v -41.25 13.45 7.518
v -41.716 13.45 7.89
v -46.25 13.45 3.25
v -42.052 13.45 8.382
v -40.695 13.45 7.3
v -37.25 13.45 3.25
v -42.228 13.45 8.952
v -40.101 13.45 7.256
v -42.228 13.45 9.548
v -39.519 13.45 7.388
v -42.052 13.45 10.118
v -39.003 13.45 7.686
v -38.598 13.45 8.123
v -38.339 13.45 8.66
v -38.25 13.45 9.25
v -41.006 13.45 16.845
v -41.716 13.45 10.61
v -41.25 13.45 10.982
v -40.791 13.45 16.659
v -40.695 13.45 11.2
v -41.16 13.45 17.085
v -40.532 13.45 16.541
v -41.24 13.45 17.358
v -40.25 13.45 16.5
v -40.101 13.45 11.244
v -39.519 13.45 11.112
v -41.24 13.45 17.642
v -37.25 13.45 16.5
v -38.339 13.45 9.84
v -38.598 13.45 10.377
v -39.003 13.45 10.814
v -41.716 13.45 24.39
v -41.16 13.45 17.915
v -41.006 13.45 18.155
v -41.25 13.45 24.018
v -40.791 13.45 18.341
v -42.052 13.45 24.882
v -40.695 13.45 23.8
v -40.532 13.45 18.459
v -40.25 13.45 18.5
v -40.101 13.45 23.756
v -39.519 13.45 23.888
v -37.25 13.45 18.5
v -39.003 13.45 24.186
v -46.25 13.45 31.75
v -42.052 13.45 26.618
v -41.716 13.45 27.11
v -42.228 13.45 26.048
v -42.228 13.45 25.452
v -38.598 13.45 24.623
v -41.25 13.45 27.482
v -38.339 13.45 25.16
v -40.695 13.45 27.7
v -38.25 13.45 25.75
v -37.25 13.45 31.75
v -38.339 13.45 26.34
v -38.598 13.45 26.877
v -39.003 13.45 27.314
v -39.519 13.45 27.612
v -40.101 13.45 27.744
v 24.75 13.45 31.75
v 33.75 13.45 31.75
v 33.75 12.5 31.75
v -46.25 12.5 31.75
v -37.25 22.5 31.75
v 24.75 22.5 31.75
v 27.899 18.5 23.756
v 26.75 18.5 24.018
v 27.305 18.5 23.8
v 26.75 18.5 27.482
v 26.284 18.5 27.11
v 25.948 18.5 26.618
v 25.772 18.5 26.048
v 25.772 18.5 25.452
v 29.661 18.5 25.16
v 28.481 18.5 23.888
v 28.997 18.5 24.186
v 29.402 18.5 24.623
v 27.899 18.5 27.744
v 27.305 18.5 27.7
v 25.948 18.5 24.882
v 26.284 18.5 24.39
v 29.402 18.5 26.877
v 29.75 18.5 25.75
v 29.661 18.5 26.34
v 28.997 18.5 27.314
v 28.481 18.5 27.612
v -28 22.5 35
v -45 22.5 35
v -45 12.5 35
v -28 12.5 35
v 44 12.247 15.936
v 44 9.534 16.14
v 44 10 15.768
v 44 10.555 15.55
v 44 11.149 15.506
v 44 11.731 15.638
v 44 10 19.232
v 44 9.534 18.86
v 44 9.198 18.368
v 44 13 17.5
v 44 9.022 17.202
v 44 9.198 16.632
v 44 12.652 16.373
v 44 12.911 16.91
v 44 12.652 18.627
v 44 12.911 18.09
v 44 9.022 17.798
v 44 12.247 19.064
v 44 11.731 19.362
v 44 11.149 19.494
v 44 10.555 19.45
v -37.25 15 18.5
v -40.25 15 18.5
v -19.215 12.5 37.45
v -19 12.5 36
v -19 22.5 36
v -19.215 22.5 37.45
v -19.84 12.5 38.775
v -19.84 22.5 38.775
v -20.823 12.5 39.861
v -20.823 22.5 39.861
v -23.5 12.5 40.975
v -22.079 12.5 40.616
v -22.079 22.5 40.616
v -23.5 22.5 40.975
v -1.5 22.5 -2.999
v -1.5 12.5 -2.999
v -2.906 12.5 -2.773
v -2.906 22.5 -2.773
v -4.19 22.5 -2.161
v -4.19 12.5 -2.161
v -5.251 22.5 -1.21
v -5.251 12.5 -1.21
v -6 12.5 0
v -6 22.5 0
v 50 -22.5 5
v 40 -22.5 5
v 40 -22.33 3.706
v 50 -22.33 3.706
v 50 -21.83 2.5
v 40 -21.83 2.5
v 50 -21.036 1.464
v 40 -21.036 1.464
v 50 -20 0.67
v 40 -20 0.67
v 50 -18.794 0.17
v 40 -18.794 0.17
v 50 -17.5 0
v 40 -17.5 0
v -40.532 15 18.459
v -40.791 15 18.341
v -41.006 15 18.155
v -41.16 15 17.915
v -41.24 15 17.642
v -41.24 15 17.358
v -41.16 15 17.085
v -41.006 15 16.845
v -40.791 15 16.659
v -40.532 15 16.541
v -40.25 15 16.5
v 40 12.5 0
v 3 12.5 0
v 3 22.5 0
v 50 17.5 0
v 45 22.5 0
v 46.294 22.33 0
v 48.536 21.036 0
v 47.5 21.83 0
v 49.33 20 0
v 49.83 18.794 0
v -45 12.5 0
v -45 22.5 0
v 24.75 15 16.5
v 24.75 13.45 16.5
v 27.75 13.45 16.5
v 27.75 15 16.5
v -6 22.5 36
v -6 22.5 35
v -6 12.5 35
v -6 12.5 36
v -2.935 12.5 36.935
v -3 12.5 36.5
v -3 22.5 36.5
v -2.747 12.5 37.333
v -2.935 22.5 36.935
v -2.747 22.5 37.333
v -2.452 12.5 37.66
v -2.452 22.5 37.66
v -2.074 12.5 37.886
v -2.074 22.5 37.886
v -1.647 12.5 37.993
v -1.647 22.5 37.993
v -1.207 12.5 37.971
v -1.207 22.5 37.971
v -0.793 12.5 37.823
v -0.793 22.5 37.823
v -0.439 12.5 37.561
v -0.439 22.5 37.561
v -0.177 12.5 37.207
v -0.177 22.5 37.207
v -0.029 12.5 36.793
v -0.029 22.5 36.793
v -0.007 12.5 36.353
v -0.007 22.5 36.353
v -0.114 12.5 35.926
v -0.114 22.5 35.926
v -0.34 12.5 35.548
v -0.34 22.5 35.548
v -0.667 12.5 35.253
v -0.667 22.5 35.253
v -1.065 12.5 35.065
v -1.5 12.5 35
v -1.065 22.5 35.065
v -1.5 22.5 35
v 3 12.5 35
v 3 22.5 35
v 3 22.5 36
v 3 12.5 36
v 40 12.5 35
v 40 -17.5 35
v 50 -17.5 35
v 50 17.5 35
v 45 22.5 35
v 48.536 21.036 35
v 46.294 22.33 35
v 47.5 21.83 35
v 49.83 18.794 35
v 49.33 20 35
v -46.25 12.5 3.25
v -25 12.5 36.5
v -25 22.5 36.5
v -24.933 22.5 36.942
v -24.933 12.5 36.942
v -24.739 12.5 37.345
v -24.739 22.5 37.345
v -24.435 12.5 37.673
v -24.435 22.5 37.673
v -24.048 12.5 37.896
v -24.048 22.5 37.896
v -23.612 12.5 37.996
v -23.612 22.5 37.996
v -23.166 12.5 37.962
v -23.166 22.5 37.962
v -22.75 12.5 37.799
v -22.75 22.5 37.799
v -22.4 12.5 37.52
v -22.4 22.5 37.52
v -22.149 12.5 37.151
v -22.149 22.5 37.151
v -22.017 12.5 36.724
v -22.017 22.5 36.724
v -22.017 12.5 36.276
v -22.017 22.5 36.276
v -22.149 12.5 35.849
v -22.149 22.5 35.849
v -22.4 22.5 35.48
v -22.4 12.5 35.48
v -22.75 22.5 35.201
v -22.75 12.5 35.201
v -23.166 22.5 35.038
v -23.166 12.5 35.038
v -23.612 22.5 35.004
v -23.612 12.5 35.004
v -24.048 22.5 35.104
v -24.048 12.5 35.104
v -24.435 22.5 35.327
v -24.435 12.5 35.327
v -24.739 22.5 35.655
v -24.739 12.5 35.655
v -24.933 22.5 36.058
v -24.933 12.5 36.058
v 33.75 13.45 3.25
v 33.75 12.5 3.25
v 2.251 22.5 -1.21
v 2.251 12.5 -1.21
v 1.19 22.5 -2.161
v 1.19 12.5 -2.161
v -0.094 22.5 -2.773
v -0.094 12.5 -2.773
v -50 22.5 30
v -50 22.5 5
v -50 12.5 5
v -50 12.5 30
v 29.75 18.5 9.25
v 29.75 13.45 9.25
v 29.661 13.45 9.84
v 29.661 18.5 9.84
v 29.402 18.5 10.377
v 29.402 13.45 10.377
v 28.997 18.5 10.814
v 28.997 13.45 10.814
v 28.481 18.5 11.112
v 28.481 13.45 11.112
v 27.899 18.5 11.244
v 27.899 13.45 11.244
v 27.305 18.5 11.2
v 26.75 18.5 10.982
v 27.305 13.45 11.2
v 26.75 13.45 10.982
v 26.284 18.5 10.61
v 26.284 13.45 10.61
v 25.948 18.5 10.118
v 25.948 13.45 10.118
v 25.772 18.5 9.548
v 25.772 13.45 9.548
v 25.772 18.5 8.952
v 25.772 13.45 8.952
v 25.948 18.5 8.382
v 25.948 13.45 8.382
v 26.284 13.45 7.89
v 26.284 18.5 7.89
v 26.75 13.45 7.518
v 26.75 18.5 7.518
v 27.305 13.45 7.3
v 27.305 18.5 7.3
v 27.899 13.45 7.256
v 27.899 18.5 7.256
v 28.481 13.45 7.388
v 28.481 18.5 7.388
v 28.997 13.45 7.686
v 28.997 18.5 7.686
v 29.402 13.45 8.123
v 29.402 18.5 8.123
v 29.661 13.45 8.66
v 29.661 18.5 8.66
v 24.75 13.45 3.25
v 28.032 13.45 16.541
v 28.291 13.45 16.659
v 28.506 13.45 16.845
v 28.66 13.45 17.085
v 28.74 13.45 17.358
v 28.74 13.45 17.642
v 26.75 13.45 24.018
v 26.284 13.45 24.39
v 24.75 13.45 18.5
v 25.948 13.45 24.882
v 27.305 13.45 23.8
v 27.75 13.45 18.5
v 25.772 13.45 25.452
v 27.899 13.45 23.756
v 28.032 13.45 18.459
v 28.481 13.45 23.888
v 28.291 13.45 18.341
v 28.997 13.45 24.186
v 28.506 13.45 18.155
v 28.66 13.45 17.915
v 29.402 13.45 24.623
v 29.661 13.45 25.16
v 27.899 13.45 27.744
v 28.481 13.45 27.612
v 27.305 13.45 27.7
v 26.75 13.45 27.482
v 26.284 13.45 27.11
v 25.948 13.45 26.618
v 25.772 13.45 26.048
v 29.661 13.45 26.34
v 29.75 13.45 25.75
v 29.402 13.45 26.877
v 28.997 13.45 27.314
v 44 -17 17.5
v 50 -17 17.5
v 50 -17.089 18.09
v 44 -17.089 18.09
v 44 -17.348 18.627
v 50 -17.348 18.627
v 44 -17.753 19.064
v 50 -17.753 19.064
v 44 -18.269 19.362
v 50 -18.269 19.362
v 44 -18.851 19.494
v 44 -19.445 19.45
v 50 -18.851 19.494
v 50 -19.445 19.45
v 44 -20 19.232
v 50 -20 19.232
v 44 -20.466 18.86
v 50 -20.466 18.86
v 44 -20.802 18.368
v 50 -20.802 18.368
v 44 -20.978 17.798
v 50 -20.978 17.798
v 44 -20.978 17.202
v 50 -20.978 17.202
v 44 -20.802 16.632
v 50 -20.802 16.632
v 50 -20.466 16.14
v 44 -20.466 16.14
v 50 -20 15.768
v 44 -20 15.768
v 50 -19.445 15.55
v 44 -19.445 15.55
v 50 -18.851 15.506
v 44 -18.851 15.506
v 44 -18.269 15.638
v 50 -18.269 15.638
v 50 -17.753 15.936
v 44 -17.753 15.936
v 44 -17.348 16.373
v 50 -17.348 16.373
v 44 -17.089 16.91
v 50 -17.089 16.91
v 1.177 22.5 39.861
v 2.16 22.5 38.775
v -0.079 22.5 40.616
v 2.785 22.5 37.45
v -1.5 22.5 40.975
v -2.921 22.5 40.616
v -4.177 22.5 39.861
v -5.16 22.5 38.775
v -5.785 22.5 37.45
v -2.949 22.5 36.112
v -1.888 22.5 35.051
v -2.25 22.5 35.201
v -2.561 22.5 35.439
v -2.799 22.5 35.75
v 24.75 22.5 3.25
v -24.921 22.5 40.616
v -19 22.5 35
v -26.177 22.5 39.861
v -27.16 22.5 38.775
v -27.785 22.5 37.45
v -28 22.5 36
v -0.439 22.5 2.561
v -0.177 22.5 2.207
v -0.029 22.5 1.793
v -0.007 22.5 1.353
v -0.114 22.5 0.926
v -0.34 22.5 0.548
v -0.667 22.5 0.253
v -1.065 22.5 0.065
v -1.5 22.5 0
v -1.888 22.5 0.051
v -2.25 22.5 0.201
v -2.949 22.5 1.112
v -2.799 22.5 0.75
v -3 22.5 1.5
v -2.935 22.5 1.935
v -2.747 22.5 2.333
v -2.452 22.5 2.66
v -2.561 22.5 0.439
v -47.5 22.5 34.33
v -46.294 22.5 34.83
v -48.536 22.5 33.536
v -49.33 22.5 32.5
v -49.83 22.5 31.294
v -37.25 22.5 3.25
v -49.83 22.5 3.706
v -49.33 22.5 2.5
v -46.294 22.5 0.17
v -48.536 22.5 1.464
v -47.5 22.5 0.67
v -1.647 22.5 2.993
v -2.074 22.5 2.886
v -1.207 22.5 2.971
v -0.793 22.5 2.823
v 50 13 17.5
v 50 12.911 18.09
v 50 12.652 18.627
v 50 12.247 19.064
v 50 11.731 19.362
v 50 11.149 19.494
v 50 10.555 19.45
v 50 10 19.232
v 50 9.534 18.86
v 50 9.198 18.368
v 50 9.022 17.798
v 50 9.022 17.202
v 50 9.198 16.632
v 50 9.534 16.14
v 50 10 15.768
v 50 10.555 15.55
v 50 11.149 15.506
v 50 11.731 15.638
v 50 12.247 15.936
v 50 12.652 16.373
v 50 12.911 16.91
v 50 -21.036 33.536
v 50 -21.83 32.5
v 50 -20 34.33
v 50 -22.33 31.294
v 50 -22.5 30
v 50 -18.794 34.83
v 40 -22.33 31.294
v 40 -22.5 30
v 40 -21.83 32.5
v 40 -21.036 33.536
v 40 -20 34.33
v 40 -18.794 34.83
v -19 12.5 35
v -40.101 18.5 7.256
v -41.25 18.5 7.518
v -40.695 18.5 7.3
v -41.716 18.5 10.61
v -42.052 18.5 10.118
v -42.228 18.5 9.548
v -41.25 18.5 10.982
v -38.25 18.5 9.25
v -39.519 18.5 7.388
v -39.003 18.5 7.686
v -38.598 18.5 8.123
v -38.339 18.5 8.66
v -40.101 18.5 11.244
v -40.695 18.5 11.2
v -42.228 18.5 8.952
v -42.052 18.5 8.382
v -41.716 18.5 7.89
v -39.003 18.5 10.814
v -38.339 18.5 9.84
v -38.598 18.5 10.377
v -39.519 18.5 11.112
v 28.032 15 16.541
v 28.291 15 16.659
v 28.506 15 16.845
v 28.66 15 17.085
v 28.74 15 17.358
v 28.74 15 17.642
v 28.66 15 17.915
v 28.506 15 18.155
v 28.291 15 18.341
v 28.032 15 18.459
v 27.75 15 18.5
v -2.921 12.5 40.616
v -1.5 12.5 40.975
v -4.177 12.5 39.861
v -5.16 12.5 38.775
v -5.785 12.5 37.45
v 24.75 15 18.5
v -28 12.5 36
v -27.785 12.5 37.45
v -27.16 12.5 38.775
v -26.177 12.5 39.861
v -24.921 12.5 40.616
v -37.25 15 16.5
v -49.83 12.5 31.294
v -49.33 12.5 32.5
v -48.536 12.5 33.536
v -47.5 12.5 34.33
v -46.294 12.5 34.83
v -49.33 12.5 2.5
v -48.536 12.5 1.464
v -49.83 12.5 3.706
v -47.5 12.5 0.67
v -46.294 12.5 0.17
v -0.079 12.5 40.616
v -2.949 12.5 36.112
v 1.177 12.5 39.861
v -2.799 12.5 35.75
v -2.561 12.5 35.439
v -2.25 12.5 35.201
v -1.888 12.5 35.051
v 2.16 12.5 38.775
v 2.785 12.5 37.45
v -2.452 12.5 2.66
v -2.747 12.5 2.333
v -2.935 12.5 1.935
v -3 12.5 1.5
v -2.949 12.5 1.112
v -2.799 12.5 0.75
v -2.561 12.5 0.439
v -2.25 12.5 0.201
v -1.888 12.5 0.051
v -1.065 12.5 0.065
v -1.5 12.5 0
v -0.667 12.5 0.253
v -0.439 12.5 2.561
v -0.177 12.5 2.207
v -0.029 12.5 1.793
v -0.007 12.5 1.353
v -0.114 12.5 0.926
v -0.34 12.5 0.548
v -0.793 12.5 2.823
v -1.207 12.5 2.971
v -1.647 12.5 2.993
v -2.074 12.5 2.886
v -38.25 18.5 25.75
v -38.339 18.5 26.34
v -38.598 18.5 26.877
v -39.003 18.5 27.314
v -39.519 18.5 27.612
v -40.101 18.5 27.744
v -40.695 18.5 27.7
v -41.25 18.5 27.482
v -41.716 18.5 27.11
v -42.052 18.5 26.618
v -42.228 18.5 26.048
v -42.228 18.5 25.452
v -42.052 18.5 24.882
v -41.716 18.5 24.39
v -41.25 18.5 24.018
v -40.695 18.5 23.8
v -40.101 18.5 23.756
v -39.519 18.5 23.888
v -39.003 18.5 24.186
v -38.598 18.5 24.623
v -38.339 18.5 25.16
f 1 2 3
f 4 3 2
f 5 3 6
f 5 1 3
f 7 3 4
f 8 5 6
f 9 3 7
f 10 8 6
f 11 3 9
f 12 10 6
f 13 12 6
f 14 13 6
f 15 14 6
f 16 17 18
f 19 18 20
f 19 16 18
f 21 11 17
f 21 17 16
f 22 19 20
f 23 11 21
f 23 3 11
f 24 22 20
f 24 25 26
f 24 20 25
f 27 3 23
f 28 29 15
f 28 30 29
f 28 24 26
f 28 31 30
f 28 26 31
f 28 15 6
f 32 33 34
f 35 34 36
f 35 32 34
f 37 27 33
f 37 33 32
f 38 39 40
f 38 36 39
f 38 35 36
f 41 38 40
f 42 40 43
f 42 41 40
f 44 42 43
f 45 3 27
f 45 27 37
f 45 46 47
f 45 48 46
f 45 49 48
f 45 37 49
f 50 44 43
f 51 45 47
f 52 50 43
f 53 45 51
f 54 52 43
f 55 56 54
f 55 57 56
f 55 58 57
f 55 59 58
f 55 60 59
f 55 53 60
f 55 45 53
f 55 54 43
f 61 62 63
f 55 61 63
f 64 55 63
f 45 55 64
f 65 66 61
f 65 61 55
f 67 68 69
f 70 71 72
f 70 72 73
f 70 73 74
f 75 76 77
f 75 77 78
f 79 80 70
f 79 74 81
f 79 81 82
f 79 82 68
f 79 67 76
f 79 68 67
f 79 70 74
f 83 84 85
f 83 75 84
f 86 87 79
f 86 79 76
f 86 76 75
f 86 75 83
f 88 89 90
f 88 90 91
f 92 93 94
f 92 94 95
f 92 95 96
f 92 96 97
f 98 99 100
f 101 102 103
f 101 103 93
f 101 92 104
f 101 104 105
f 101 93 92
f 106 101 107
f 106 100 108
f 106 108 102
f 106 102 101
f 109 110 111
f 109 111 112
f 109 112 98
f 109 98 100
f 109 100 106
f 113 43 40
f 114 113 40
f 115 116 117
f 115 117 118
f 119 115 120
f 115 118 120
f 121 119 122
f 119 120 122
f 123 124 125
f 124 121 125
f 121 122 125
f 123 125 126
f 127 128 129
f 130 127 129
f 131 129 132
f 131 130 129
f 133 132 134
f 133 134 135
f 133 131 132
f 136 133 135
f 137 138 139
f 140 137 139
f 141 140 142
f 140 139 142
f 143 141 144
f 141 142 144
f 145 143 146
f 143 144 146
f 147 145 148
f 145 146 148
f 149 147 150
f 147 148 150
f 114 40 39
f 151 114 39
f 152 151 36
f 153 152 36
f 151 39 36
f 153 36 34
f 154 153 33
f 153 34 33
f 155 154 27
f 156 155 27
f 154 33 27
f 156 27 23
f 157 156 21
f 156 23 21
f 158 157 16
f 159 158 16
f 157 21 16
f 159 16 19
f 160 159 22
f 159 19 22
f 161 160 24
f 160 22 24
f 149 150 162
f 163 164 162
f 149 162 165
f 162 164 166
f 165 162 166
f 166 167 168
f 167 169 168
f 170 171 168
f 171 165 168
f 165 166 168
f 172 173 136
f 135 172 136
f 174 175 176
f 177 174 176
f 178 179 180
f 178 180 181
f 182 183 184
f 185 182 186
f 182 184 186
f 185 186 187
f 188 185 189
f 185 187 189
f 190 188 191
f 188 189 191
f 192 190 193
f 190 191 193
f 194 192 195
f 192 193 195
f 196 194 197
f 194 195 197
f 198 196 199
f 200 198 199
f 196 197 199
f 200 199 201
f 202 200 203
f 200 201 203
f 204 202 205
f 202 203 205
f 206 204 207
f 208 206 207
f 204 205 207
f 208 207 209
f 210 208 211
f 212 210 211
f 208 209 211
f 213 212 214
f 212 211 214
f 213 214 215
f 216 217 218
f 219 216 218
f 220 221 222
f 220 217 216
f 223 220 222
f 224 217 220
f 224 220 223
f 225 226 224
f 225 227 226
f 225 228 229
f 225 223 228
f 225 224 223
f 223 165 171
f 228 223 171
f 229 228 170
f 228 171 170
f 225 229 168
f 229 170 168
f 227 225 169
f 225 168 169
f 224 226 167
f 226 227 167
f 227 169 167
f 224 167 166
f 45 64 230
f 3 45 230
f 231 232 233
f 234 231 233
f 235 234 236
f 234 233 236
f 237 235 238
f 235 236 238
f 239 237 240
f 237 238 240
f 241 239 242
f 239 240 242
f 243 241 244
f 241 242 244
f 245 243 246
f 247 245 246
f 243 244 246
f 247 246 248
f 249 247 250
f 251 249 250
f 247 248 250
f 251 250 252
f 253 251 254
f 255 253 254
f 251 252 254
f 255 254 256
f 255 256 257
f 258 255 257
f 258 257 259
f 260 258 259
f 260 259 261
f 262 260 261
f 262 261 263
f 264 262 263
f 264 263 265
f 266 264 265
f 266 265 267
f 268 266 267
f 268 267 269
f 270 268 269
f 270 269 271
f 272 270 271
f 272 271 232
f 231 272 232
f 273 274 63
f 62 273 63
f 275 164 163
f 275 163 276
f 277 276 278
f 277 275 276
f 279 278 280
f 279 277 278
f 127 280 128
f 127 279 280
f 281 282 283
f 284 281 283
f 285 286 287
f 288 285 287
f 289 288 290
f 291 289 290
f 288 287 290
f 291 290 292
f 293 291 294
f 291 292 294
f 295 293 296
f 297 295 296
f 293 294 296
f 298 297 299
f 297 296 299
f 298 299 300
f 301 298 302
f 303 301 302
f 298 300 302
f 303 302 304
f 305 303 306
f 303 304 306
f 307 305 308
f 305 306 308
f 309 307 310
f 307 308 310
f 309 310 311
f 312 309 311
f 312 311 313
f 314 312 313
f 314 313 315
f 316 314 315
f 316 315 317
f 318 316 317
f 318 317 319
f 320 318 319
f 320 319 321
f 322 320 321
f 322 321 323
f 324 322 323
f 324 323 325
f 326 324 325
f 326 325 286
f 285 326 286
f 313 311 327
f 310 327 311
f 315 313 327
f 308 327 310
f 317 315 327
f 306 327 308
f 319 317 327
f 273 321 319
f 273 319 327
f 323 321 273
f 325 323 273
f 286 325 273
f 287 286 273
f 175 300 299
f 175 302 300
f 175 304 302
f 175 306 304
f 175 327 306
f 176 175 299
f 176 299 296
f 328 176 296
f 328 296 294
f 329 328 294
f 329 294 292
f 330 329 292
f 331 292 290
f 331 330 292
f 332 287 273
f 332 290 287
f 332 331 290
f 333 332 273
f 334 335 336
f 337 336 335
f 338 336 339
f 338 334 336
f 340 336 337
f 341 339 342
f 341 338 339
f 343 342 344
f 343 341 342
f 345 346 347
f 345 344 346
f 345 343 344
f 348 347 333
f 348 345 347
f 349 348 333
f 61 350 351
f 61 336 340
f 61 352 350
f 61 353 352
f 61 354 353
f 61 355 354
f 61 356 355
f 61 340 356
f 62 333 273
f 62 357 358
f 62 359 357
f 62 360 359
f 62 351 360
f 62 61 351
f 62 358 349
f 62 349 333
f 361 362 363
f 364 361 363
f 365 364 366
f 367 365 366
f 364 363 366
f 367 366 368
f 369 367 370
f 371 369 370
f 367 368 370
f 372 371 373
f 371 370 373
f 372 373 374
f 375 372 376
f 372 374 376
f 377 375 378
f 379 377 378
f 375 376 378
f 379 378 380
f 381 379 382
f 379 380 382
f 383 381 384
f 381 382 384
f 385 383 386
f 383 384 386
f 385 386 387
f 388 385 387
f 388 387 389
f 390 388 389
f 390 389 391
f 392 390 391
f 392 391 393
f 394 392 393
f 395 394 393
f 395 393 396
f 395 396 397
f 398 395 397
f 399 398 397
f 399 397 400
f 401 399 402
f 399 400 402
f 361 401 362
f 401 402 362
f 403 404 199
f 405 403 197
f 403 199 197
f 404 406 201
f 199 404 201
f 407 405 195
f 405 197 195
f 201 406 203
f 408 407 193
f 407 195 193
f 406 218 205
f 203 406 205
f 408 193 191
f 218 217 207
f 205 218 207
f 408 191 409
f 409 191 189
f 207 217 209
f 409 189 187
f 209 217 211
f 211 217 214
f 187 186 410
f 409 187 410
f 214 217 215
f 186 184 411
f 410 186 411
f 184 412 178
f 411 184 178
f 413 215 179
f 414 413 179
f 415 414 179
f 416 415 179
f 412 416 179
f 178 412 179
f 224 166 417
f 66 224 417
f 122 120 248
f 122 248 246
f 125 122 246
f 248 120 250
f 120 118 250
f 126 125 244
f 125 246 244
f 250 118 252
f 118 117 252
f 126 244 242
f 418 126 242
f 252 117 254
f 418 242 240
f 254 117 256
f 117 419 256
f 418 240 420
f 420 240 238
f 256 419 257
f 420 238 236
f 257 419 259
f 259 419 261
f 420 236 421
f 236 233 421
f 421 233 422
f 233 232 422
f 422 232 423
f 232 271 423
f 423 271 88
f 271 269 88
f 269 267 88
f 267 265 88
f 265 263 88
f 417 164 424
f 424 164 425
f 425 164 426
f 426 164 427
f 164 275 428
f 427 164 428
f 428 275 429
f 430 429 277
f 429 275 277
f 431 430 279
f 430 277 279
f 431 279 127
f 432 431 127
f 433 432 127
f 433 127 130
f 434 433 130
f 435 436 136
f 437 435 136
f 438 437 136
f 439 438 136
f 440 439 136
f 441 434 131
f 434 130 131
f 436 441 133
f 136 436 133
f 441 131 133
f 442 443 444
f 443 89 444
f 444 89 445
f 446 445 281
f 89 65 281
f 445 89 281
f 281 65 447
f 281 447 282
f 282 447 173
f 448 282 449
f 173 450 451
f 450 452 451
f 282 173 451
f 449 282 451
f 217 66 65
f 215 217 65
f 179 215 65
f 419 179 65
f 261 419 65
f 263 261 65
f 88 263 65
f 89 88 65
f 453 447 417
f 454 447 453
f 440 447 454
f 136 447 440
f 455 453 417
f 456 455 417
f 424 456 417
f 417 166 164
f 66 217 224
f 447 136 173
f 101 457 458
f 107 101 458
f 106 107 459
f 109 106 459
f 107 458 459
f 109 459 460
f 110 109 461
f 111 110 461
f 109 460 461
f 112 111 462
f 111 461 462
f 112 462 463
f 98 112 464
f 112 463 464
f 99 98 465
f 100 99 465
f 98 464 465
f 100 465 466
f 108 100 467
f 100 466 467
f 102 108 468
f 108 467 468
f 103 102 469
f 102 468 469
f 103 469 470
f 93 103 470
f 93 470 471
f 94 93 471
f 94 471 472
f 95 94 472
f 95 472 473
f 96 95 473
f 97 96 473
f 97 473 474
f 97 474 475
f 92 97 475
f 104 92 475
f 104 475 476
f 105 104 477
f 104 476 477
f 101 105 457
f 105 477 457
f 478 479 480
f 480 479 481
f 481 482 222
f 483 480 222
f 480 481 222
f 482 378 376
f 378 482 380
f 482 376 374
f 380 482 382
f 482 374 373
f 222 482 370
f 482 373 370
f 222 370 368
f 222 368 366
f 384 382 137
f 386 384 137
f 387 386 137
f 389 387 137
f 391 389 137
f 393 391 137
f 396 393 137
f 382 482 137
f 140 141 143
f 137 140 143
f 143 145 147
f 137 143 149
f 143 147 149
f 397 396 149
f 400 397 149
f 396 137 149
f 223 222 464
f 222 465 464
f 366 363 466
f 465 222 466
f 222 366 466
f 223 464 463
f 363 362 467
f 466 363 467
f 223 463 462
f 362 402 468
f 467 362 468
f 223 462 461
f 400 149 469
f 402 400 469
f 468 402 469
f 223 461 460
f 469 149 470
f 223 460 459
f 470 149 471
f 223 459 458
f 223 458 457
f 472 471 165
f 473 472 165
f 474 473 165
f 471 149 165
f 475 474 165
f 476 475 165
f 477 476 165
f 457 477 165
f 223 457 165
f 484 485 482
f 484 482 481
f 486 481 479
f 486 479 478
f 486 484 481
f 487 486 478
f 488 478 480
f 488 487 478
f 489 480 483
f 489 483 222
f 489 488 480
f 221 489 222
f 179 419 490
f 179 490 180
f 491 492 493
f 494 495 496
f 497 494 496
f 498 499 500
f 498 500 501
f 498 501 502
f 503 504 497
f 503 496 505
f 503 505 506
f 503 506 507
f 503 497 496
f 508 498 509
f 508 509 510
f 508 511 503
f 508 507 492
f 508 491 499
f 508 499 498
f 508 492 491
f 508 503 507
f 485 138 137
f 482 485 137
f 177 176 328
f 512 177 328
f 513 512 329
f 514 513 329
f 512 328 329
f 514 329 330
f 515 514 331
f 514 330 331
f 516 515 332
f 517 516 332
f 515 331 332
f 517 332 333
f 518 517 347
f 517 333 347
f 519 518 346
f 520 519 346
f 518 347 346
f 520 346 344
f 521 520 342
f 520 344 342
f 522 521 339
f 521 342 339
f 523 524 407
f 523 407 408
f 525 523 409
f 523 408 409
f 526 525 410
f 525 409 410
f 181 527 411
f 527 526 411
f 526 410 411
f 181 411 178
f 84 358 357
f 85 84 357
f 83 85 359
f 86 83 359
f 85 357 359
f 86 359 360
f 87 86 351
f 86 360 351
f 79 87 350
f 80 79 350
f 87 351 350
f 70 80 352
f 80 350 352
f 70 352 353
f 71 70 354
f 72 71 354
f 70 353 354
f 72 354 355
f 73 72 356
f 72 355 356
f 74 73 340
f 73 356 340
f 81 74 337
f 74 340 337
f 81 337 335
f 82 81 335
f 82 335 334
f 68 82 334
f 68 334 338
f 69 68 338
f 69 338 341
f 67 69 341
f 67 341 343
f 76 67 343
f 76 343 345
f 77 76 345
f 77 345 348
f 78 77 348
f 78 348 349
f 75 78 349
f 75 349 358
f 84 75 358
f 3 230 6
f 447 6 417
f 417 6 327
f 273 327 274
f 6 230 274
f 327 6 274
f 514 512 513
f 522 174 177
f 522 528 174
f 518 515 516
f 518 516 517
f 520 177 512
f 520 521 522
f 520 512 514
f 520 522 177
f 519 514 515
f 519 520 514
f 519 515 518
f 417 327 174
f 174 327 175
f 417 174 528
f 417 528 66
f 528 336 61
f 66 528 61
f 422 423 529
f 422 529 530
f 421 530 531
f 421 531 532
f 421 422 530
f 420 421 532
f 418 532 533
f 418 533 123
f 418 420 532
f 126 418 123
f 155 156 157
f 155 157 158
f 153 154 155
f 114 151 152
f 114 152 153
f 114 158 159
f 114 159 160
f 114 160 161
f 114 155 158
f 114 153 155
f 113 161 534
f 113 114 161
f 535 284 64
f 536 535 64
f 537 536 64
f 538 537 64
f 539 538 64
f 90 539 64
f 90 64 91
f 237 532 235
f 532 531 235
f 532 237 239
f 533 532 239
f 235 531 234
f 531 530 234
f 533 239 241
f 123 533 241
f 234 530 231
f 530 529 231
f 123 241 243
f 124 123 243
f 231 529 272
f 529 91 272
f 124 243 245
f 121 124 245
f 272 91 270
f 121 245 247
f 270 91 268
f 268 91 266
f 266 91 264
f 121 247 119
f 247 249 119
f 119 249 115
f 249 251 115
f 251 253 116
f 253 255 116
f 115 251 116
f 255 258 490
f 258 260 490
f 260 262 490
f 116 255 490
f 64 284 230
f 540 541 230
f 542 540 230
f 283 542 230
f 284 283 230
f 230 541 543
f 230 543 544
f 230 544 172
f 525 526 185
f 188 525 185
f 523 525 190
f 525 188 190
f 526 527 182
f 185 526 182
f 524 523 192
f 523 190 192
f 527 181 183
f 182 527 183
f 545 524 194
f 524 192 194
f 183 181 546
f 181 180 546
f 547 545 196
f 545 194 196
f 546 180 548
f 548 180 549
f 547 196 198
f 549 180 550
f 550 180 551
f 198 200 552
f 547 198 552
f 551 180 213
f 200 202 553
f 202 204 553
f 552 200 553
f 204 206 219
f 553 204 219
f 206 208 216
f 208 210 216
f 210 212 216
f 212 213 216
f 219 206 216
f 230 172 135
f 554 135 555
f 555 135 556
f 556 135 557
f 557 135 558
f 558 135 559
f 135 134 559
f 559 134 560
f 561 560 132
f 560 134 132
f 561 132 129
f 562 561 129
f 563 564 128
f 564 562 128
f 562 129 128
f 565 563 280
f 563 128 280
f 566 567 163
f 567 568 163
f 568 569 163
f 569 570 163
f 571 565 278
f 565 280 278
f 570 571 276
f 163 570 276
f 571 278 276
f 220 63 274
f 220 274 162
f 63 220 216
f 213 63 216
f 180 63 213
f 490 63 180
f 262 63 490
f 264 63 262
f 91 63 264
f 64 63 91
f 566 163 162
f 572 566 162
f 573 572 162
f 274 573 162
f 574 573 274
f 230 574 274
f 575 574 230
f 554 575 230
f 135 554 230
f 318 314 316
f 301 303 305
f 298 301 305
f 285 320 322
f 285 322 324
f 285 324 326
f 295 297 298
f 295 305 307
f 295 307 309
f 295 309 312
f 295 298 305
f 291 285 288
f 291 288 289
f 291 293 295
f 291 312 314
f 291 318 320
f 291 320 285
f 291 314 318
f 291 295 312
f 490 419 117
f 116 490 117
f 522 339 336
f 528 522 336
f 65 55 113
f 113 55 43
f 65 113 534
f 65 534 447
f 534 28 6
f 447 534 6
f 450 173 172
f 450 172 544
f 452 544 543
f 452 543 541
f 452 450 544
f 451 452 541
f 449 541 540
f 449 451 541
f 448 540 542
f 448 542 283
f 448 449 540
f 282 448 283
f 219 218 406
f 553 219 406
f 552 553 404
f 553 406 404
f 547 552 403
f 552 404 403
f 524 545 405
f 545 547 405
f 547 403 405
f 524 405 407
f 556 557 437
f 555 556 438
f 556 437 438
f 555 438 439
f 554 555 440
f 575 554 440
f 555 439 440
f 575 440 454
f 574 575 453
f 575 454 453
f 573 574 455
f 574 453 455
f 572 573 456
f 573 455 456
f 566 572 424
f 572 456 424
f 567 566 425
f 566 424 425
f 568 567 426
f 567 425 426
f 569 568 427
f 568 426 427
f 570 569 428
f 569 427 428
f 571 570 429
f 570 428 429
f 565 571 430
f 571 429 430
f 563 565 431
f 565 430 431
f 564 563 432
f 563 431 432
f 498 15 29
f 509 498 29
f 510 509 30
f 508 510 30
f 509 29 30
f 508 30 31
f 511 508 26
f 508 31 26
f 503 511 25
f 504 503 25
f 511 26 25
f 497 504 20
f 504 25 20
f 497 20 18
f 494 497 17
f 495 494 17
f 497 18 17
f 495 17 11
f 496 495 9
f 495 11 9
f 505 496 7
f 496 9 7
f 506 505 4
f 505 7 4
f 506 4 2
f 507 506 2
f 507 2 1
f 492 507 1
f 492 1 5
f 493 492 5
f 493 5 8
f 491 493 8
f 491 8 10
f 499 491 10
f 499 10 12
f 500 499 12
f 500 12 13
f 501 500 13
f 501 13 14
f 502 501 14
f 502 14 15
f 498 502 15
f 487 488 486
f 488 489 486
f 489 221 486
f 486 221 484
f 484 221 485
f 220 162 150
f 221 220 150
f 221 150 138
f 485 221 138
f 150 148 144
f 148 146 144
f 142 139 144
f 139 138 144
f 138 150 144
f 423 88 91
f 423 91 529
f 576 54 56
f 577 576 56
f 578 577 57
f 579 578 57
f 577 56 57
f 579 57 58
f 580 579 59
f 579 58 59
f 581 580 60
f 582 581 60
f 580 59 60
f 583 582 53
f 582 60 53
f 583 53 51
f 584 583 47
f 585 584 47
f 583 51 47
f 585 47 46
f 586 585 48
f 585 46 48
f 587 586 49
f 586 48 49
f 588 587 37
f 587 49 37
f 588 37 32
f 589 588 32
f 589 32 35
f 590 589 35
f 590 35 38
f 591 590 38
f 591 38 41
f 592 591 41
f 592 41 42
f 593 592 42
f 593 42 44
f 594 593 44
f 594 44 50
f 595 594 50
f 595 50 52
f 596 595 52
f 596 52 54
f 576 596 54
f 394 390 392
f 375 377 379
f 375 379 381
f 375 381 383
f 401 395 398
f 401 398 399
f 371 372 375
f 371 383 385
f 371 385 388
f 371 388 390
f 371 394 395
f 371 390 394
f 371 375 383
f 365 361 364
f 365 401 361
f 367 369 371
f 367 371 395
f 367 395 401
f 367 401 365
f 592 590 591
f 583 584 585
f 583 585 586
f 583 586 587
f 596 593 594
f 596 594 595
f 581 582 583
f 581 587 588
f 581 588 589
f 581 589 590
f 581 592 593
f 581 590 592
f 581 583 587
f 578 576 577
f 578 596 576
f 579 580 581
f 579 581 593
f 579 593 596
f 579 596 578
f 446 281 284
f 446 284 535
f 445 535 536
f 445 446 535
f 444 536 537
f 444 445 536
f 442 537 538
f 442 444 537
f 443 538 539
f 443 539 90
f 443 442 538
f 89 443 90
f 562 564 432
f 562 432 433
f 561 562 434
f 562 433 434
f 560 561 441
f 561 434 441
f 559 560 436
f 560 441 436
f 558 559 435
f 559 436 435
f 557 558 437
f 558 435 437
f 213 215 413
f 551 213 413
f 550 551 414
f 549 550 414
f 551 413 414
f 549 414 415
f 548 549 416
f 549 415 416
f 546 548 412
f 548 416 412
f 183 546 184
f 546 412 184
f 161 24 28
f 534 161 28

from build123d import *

# Parameters (mm, degrees)
F2_DEPTH     = 35
F4_DEPTH     = 10
F3_R         = 2
F5_DEPTH     = 0.95
F6_DEPTH     = 2.5
F7_DEPTH     = 6
F8_W         = 9
F8_H         = 9.25
F8_R         = 1.5
F8_H_2       = 6.25
F9_DEPTH     = 10
F10_DEPTH    = 10
F11_R        = 2
F12_DEPTH    = 6
F13_T1_DEPTH = 35
F13_T3_DEPTH = 35
F13_T5_DEPTH = 60
F13_T7_DEPTH = 32.9128784748


# Not quite as in the source:
# - a fillet or chamfer that OpenCascade refuses, or shapes differently, is made with other operations: its cross-section is extruded or revolved along the edge and cut away or added


with BuildPart() as f2:
    # F1 (on Top) → F2 (new body)
    with BuildSketch(Plane.XY):
        Polygon((50, -22.5), (50, 22.5), (-50, 22.5), (-50, 12.5), (40, 12.5), (40, -22.5), align=None)
    extrude(amount=F2_DEPTH)

    # F3 (on face) → F4 (cut, through all)
    with BuildSketch(Plane.XZ.offset(-12.5)):
        with BuildLine():
            Line((-37.25, 3.25), (24.75, 3.25))
            Line((24.75, 3.25), (24.75, 16.5))
            ThreePointArc((24.75, 16.5), (23.75, 17.5), (24.75, 18.5))
            Line((24.75, 18.5), (24.75, 31.75))
            Line((24.75, 31.75), (-37.25, 31.75))
            Line((-37.25, 31.75), (-37.25, 18.5))
            ThreePointArc((-37.25, 18.5), (-36.25, 17.5), (-37.25, 16.5))
            Line((-37.25, 16.5), (-37.25, 3.25))
        make_face()
        with BuildLine():
            Line((-37.25, 17.5), (-37.25, 16.5))
            ThreePointArc((-37.25, 16.5), (-36.25, 17.5), (-37.25, 18.5))
            Line((-37.25, 18.5), (-37.25, 17.5))
        make_face()
        with BuildLine():
            ThreePointArc((24.75, 18.5), (23.75, 17.5), (24.75, 16.5))
            Line((24.75, 16.5), (24.75, 17.5))
            Line((24.75, 17.5), (24.75, 18.5))
        make_face()
    extrude(amount=-F4_DEPTH, mode=Mode.SUBTRACT)

    # F3 (on face) → F5 (cut)
    with BuildSketch(Plane.XZ.offset(-12.5)):
        with BuildLine():
            Line((-43.25, 3.25), (-37.25, 3.25))
            Line((-37.25, 3.25), (-37.25, 16.5))
            Line((-37.25, 16.5), (-40.25, 16.5))
            ThreePointArc((-40.25, 16.5), (-41.25, 17.5), (-40.25, 18.5))
            Line((-40.25, 18.5), (-37.25, 18.5))
            Line((-37.25, 18.5), (-37.25, 31.75))
            Line((-37.25, 31.75), (-43.25, 31.75))
            Line((-43.25, 31.75), (-46.25, 31.75))
            Line((-46.25, 31.75), (-46.25, 3.25))
            Line((-46.25, 3.25), (-43.25, 3.25))
        make_face()
        with Locations((-40.25, 9.25)):
            Circle(F3_R, mode=Mode.SUBTRACT)
        with Locations((-40.25, 25.75)):
            Circle(F3_R, mode=Mode.SUBTRACT)
        with BuildLine():
            Line((27.75, 3.25), (30.75, 3.25))
            Line((30.75, 3.25), (33.75, 3.25))
            Line((33.75, 3.25), (33.75, 31.75))
            Line((33.75, 31.75), (30.75, 31.75))
            Line((30.75, 31.75), (24.75, 31.75))
            Line((24.75, 31.75), (24.75, 18.5))
            Line((24.75, 18.5), (27.75, 18.5))
            ThreePointArc((27.75, 18.5), (28.75, 17.5), (27.75, 16.5))
            Line((27.75, 16.5), (24.75, 16.5))
            Line((24.75, 16.5), (24.75, 3.25))
            Line((24.75, 3.25), (27.75, 3.25))
        make_face()
        with Locations((27.75, 9.25)):
            Circle(F3_R, mode=Mode.SUBTRACT)
        with Locations((27.75, 25.75)):
            Circle(F3_R, mode=Mode.SUBTRACT)
        with BuildLine():
            Line((-40.25, 16.5), (-37.25, 16.5))
            Line((-37.25, 16.5), (-37.25, 17.5))
            Line((-37.25, 17.5), (-37.25, 18.5))
            Line((-37.25, 18.5), (-40.25, 18.5))
            ThreePointArc((-40.25, 18.5), (-41.25, 17.5), (-40.25, 16.5))
        make_face()
        with BuildLine():
            Line((24.75, 17.5), (24.75, 16.5))
            Line((24.75, 16.5), (27.75, 16.5))
            ThreePointArc((27.75, 16.5), (28.75, 17.5), (27.75, 18.5))
            Line((27.75, 18.5), (24.75, 18.5))
            Line((24.75, 18.5), (24.75, 17.5))
        make_face()
    extrude(amount=-F5_DEPTH, mode=Mode.SUBTRACT)

    # F3 (on face) → F6 (cut)
    with BuildSketch(Plane.XZ.offset(-12.5)):
        with BuildLine():
            Line((-40.25, 16.5), (-37.25, 16.5))
            Line((-37.25, 16.5), (-37.25, 17.5))
            Line((-37.25, 17.5), (-37.25, 18.5))
            Line((-37.25, 18.5), (-40.25, 18.5))
            ThreePointArc((-40.25, 18.5), (-41.25, 17.5), (-40.25, 16.5))
        make_face()
        with BuildLine():
            Line((24.75, 17.5), (24.75, 16.5))
            Line((24.75, 16.5), (27.75, 16.5))
            ThreePointArc((27.75, 16.5), (28.75, 17.5), (27.75, 18.5))
            Line((27.75, 18.5), (24.75, 18.5))
            Line((24.75, 18.5), (24.75, 17.5))
        make_face()
    extrude(amount=-F6_DEPTH, mode=Mode.SUBTRACT)

    # F3 (on face) → F7 (cut)
    with BuildSketch(Plane.XZ.offset(-12.5)):
        with Locations((-40.25, 25.75)):
            Circle(F3_R)
        with Locations((-40.25, 9.25)):
            Circle(F3_R)
        with Locations((27.75, 9.25)):
            Circle(F3_R)
        with Locations((27.75, 25.75)):
            Circle(F3_R)
    extrude(amount=-F7_DEPTH, mode=Mode.SUBTRACT)

    # F8 (on face) → F9 (join, through all)
    with BuildSketch(Plane(origin=(0, 22.5, 0), x_dir=(-1, 0, 0), z_dir=(0, 1, 0))):
        with Locations((1.5, 36.375)):
            Rectangle(F8_W, F8_H)
        with Locations((1.5, 36.5)):
            Circle(F8_R, mode=Mode.SUBTRACT)
        with Locations((1.5, 0.125)):
            Rectangle(F8_W, F8_H_2)
        with Locations((1.5, 1.5)):
            Circle(F8_R, mode=Mode.SUBTRACT)
        with Locations((23.5, 36.375)):
            Rectangle(F8_W, F8_H)
        with Locations((23.5, 36.5)):
            Circle(F8_R, mode=Mode.SUBTRACT)
        with BuildLine():
            ThreePointArc((3, 36.5), (0.4393398187, 37.5606601622), (1.5000000271, 35))
            ThreePointArc((1.5000000271, 35), (2.5606601813, 35.4393398378), (3, 36.5))
        make_face()
    extrude(amount=-F9_DEPTH)

    # F8 (on face) → F10 (cut, through all)
    with BuildSketch(Plane(origin=(0, 22.5, 0), x_dir=(-1, 0, 0), z_dir=(0, 1, 0))):
        with BuildLine():
            ThreePointArc((3, 1.5), (0.4393398305, 2.560660174), (1.4999999936, 0))
            ThreePointArc((1.4999999936, 0), (2.5606601695, 0.439339826), (3, 1.5))
        make_face()
        with BuildLine():
            ThreePointArc((3, 36.5), (0.4393398187, 37.5606601622), (1.5000000271, 35))
            ThreePointArc((1.5000000271, 35), (2.5606601813, 35.4393398378), (3, 36.5))
        make_face()
    extrude(amount=-F10_DEPTH, mode=Mode.SUBTRACT)

    # F11 (on face) → F12 (cut)
    with BuildSketch(Plane.YZ.offset(50)):
        with Locations((-19, 17.5)):
            Circle(F11_R)
        with Locations((11, 17.5)):
            Circle(F11_R)
    extrude(amount=-F12_DEPTH, mode=Mode.SUBTRACT)

    # F13: fillet of radius 5 on 11 edges, made by hand

    # F13_s2 → F13_t1 (cut)
    with BuildSketch(Plane.XZ.offset(-35)):
        with BuildLine():
            ThreePointArc((-50, 30), (-48.5355339059, 33.5355339059), (-45, 35))
            Line((-45, 35), (-50, 35))
            Line((-50, 35), (-50, 30))
        make_face()
        with BuildLine():
            ThreePointArc((-45, 0), (-48.5355339059, 1.4644660941), (-50, 5))
            Line((-50, 5), (-50, 0))
            Line((-50, 0), (-45, 0))
        make_face()
        with BuildLine():
            ThreePointArc((-1, 41), (-4.5355339059, 39.5355339059), (-6, 36))
            Line((-6, 36), (-6, 41))
            Line((-6, 41), (-1, 41))
        make_face()
        with BuildLine():
            ThreePointArc((3, 36), (1.5355339059, 39.5355339059), (-2, 41))
            Line((-2, 41), (3, 41))
            Line((3, 41), (3, 36))
        make_face()
        with BuildLine():
            ThreePointArc((-28, 36), (-26.5355339059, 39.5355339059), (-23, 41))
            Line((-23, 41), (-28, 41))
            Line((-28, 41), (-28, 36))
        make_face()
        with BuildLine():
            ThreePointArc((-19, 36), (-20.4644660941, 39.5355339059), (-24, 41))
            Line((-24, 41), (-19, 41))
            Line((-19, 41), (-19, 36))
        make_face()
    extrude(amount=F13_T1_DEPTH, mode=Mode.SUBTRACT)

    # F13_s4 → F13_t3 (cut)
    with BuildSketch(Plane.YZ.offset(27.5)):
        with BuildLine():
            ThreePointArc((-22.5, 30), (-21.0355339059, 33.5355339059), (-17.5, 35))
            Line((-17.5, 35), (-22.5, 35))
            Line((-22.5, 35), (-22.5, 30))
        make_face()
        with BuildLine():
            ThreePointArc((-22.5, 5), (-21.0355339059, 1.4644660941), (-17.5, 0))
            Line((-17.5, 0), (-22.5, 0))
            Line((-22.5, 0), (-22.5, 5))
        make_face()
    extrude(amount=F13_T3_DEPTH, mode=Mode.SUBTRACT)

    # F13_s6 → F13_t5 (cut)
    with BuildSketch(Plane.XY.offset(-12.5)):
        with BuildLine():
            ThreePointArc((50, 17.5), (48.5355339059, 21.0355339059), (45, 22.5))
            Line((45, 22.5), (50, 22.5))
            Line((50, 22.5), (50, 17.5))
        make_face()
    extrude(amount=F13_T5_DEPTH, mode=Mode.SUBTRACT)

    # F13_s8 → F13_t7 (cut)
    with BuildSketch(Plane.XZ.offset(-33.9564392374)):
        with BuildLine():
            ThreePointArc((3, 0), (1.1560370926, -2.1833001327), (-1.582575695, -3))
            Line((-1.582575695, -3), (3, -3))
            Line((3, -3), (3, 0))
        make_face()
        with BuildLine():
            ThreePointArc((-1.417424305, -3), (-4.1560370926, -2.1833001327), (-6, 0))
            Line((-6, 0), (-6, -3))
            Line((-6, -3), (-1.417424305, -3))
        make_face()
    extrude(amount=F13_T7_DEPTH, mode=Mode.SUBTRACT)


solid = f2.part
